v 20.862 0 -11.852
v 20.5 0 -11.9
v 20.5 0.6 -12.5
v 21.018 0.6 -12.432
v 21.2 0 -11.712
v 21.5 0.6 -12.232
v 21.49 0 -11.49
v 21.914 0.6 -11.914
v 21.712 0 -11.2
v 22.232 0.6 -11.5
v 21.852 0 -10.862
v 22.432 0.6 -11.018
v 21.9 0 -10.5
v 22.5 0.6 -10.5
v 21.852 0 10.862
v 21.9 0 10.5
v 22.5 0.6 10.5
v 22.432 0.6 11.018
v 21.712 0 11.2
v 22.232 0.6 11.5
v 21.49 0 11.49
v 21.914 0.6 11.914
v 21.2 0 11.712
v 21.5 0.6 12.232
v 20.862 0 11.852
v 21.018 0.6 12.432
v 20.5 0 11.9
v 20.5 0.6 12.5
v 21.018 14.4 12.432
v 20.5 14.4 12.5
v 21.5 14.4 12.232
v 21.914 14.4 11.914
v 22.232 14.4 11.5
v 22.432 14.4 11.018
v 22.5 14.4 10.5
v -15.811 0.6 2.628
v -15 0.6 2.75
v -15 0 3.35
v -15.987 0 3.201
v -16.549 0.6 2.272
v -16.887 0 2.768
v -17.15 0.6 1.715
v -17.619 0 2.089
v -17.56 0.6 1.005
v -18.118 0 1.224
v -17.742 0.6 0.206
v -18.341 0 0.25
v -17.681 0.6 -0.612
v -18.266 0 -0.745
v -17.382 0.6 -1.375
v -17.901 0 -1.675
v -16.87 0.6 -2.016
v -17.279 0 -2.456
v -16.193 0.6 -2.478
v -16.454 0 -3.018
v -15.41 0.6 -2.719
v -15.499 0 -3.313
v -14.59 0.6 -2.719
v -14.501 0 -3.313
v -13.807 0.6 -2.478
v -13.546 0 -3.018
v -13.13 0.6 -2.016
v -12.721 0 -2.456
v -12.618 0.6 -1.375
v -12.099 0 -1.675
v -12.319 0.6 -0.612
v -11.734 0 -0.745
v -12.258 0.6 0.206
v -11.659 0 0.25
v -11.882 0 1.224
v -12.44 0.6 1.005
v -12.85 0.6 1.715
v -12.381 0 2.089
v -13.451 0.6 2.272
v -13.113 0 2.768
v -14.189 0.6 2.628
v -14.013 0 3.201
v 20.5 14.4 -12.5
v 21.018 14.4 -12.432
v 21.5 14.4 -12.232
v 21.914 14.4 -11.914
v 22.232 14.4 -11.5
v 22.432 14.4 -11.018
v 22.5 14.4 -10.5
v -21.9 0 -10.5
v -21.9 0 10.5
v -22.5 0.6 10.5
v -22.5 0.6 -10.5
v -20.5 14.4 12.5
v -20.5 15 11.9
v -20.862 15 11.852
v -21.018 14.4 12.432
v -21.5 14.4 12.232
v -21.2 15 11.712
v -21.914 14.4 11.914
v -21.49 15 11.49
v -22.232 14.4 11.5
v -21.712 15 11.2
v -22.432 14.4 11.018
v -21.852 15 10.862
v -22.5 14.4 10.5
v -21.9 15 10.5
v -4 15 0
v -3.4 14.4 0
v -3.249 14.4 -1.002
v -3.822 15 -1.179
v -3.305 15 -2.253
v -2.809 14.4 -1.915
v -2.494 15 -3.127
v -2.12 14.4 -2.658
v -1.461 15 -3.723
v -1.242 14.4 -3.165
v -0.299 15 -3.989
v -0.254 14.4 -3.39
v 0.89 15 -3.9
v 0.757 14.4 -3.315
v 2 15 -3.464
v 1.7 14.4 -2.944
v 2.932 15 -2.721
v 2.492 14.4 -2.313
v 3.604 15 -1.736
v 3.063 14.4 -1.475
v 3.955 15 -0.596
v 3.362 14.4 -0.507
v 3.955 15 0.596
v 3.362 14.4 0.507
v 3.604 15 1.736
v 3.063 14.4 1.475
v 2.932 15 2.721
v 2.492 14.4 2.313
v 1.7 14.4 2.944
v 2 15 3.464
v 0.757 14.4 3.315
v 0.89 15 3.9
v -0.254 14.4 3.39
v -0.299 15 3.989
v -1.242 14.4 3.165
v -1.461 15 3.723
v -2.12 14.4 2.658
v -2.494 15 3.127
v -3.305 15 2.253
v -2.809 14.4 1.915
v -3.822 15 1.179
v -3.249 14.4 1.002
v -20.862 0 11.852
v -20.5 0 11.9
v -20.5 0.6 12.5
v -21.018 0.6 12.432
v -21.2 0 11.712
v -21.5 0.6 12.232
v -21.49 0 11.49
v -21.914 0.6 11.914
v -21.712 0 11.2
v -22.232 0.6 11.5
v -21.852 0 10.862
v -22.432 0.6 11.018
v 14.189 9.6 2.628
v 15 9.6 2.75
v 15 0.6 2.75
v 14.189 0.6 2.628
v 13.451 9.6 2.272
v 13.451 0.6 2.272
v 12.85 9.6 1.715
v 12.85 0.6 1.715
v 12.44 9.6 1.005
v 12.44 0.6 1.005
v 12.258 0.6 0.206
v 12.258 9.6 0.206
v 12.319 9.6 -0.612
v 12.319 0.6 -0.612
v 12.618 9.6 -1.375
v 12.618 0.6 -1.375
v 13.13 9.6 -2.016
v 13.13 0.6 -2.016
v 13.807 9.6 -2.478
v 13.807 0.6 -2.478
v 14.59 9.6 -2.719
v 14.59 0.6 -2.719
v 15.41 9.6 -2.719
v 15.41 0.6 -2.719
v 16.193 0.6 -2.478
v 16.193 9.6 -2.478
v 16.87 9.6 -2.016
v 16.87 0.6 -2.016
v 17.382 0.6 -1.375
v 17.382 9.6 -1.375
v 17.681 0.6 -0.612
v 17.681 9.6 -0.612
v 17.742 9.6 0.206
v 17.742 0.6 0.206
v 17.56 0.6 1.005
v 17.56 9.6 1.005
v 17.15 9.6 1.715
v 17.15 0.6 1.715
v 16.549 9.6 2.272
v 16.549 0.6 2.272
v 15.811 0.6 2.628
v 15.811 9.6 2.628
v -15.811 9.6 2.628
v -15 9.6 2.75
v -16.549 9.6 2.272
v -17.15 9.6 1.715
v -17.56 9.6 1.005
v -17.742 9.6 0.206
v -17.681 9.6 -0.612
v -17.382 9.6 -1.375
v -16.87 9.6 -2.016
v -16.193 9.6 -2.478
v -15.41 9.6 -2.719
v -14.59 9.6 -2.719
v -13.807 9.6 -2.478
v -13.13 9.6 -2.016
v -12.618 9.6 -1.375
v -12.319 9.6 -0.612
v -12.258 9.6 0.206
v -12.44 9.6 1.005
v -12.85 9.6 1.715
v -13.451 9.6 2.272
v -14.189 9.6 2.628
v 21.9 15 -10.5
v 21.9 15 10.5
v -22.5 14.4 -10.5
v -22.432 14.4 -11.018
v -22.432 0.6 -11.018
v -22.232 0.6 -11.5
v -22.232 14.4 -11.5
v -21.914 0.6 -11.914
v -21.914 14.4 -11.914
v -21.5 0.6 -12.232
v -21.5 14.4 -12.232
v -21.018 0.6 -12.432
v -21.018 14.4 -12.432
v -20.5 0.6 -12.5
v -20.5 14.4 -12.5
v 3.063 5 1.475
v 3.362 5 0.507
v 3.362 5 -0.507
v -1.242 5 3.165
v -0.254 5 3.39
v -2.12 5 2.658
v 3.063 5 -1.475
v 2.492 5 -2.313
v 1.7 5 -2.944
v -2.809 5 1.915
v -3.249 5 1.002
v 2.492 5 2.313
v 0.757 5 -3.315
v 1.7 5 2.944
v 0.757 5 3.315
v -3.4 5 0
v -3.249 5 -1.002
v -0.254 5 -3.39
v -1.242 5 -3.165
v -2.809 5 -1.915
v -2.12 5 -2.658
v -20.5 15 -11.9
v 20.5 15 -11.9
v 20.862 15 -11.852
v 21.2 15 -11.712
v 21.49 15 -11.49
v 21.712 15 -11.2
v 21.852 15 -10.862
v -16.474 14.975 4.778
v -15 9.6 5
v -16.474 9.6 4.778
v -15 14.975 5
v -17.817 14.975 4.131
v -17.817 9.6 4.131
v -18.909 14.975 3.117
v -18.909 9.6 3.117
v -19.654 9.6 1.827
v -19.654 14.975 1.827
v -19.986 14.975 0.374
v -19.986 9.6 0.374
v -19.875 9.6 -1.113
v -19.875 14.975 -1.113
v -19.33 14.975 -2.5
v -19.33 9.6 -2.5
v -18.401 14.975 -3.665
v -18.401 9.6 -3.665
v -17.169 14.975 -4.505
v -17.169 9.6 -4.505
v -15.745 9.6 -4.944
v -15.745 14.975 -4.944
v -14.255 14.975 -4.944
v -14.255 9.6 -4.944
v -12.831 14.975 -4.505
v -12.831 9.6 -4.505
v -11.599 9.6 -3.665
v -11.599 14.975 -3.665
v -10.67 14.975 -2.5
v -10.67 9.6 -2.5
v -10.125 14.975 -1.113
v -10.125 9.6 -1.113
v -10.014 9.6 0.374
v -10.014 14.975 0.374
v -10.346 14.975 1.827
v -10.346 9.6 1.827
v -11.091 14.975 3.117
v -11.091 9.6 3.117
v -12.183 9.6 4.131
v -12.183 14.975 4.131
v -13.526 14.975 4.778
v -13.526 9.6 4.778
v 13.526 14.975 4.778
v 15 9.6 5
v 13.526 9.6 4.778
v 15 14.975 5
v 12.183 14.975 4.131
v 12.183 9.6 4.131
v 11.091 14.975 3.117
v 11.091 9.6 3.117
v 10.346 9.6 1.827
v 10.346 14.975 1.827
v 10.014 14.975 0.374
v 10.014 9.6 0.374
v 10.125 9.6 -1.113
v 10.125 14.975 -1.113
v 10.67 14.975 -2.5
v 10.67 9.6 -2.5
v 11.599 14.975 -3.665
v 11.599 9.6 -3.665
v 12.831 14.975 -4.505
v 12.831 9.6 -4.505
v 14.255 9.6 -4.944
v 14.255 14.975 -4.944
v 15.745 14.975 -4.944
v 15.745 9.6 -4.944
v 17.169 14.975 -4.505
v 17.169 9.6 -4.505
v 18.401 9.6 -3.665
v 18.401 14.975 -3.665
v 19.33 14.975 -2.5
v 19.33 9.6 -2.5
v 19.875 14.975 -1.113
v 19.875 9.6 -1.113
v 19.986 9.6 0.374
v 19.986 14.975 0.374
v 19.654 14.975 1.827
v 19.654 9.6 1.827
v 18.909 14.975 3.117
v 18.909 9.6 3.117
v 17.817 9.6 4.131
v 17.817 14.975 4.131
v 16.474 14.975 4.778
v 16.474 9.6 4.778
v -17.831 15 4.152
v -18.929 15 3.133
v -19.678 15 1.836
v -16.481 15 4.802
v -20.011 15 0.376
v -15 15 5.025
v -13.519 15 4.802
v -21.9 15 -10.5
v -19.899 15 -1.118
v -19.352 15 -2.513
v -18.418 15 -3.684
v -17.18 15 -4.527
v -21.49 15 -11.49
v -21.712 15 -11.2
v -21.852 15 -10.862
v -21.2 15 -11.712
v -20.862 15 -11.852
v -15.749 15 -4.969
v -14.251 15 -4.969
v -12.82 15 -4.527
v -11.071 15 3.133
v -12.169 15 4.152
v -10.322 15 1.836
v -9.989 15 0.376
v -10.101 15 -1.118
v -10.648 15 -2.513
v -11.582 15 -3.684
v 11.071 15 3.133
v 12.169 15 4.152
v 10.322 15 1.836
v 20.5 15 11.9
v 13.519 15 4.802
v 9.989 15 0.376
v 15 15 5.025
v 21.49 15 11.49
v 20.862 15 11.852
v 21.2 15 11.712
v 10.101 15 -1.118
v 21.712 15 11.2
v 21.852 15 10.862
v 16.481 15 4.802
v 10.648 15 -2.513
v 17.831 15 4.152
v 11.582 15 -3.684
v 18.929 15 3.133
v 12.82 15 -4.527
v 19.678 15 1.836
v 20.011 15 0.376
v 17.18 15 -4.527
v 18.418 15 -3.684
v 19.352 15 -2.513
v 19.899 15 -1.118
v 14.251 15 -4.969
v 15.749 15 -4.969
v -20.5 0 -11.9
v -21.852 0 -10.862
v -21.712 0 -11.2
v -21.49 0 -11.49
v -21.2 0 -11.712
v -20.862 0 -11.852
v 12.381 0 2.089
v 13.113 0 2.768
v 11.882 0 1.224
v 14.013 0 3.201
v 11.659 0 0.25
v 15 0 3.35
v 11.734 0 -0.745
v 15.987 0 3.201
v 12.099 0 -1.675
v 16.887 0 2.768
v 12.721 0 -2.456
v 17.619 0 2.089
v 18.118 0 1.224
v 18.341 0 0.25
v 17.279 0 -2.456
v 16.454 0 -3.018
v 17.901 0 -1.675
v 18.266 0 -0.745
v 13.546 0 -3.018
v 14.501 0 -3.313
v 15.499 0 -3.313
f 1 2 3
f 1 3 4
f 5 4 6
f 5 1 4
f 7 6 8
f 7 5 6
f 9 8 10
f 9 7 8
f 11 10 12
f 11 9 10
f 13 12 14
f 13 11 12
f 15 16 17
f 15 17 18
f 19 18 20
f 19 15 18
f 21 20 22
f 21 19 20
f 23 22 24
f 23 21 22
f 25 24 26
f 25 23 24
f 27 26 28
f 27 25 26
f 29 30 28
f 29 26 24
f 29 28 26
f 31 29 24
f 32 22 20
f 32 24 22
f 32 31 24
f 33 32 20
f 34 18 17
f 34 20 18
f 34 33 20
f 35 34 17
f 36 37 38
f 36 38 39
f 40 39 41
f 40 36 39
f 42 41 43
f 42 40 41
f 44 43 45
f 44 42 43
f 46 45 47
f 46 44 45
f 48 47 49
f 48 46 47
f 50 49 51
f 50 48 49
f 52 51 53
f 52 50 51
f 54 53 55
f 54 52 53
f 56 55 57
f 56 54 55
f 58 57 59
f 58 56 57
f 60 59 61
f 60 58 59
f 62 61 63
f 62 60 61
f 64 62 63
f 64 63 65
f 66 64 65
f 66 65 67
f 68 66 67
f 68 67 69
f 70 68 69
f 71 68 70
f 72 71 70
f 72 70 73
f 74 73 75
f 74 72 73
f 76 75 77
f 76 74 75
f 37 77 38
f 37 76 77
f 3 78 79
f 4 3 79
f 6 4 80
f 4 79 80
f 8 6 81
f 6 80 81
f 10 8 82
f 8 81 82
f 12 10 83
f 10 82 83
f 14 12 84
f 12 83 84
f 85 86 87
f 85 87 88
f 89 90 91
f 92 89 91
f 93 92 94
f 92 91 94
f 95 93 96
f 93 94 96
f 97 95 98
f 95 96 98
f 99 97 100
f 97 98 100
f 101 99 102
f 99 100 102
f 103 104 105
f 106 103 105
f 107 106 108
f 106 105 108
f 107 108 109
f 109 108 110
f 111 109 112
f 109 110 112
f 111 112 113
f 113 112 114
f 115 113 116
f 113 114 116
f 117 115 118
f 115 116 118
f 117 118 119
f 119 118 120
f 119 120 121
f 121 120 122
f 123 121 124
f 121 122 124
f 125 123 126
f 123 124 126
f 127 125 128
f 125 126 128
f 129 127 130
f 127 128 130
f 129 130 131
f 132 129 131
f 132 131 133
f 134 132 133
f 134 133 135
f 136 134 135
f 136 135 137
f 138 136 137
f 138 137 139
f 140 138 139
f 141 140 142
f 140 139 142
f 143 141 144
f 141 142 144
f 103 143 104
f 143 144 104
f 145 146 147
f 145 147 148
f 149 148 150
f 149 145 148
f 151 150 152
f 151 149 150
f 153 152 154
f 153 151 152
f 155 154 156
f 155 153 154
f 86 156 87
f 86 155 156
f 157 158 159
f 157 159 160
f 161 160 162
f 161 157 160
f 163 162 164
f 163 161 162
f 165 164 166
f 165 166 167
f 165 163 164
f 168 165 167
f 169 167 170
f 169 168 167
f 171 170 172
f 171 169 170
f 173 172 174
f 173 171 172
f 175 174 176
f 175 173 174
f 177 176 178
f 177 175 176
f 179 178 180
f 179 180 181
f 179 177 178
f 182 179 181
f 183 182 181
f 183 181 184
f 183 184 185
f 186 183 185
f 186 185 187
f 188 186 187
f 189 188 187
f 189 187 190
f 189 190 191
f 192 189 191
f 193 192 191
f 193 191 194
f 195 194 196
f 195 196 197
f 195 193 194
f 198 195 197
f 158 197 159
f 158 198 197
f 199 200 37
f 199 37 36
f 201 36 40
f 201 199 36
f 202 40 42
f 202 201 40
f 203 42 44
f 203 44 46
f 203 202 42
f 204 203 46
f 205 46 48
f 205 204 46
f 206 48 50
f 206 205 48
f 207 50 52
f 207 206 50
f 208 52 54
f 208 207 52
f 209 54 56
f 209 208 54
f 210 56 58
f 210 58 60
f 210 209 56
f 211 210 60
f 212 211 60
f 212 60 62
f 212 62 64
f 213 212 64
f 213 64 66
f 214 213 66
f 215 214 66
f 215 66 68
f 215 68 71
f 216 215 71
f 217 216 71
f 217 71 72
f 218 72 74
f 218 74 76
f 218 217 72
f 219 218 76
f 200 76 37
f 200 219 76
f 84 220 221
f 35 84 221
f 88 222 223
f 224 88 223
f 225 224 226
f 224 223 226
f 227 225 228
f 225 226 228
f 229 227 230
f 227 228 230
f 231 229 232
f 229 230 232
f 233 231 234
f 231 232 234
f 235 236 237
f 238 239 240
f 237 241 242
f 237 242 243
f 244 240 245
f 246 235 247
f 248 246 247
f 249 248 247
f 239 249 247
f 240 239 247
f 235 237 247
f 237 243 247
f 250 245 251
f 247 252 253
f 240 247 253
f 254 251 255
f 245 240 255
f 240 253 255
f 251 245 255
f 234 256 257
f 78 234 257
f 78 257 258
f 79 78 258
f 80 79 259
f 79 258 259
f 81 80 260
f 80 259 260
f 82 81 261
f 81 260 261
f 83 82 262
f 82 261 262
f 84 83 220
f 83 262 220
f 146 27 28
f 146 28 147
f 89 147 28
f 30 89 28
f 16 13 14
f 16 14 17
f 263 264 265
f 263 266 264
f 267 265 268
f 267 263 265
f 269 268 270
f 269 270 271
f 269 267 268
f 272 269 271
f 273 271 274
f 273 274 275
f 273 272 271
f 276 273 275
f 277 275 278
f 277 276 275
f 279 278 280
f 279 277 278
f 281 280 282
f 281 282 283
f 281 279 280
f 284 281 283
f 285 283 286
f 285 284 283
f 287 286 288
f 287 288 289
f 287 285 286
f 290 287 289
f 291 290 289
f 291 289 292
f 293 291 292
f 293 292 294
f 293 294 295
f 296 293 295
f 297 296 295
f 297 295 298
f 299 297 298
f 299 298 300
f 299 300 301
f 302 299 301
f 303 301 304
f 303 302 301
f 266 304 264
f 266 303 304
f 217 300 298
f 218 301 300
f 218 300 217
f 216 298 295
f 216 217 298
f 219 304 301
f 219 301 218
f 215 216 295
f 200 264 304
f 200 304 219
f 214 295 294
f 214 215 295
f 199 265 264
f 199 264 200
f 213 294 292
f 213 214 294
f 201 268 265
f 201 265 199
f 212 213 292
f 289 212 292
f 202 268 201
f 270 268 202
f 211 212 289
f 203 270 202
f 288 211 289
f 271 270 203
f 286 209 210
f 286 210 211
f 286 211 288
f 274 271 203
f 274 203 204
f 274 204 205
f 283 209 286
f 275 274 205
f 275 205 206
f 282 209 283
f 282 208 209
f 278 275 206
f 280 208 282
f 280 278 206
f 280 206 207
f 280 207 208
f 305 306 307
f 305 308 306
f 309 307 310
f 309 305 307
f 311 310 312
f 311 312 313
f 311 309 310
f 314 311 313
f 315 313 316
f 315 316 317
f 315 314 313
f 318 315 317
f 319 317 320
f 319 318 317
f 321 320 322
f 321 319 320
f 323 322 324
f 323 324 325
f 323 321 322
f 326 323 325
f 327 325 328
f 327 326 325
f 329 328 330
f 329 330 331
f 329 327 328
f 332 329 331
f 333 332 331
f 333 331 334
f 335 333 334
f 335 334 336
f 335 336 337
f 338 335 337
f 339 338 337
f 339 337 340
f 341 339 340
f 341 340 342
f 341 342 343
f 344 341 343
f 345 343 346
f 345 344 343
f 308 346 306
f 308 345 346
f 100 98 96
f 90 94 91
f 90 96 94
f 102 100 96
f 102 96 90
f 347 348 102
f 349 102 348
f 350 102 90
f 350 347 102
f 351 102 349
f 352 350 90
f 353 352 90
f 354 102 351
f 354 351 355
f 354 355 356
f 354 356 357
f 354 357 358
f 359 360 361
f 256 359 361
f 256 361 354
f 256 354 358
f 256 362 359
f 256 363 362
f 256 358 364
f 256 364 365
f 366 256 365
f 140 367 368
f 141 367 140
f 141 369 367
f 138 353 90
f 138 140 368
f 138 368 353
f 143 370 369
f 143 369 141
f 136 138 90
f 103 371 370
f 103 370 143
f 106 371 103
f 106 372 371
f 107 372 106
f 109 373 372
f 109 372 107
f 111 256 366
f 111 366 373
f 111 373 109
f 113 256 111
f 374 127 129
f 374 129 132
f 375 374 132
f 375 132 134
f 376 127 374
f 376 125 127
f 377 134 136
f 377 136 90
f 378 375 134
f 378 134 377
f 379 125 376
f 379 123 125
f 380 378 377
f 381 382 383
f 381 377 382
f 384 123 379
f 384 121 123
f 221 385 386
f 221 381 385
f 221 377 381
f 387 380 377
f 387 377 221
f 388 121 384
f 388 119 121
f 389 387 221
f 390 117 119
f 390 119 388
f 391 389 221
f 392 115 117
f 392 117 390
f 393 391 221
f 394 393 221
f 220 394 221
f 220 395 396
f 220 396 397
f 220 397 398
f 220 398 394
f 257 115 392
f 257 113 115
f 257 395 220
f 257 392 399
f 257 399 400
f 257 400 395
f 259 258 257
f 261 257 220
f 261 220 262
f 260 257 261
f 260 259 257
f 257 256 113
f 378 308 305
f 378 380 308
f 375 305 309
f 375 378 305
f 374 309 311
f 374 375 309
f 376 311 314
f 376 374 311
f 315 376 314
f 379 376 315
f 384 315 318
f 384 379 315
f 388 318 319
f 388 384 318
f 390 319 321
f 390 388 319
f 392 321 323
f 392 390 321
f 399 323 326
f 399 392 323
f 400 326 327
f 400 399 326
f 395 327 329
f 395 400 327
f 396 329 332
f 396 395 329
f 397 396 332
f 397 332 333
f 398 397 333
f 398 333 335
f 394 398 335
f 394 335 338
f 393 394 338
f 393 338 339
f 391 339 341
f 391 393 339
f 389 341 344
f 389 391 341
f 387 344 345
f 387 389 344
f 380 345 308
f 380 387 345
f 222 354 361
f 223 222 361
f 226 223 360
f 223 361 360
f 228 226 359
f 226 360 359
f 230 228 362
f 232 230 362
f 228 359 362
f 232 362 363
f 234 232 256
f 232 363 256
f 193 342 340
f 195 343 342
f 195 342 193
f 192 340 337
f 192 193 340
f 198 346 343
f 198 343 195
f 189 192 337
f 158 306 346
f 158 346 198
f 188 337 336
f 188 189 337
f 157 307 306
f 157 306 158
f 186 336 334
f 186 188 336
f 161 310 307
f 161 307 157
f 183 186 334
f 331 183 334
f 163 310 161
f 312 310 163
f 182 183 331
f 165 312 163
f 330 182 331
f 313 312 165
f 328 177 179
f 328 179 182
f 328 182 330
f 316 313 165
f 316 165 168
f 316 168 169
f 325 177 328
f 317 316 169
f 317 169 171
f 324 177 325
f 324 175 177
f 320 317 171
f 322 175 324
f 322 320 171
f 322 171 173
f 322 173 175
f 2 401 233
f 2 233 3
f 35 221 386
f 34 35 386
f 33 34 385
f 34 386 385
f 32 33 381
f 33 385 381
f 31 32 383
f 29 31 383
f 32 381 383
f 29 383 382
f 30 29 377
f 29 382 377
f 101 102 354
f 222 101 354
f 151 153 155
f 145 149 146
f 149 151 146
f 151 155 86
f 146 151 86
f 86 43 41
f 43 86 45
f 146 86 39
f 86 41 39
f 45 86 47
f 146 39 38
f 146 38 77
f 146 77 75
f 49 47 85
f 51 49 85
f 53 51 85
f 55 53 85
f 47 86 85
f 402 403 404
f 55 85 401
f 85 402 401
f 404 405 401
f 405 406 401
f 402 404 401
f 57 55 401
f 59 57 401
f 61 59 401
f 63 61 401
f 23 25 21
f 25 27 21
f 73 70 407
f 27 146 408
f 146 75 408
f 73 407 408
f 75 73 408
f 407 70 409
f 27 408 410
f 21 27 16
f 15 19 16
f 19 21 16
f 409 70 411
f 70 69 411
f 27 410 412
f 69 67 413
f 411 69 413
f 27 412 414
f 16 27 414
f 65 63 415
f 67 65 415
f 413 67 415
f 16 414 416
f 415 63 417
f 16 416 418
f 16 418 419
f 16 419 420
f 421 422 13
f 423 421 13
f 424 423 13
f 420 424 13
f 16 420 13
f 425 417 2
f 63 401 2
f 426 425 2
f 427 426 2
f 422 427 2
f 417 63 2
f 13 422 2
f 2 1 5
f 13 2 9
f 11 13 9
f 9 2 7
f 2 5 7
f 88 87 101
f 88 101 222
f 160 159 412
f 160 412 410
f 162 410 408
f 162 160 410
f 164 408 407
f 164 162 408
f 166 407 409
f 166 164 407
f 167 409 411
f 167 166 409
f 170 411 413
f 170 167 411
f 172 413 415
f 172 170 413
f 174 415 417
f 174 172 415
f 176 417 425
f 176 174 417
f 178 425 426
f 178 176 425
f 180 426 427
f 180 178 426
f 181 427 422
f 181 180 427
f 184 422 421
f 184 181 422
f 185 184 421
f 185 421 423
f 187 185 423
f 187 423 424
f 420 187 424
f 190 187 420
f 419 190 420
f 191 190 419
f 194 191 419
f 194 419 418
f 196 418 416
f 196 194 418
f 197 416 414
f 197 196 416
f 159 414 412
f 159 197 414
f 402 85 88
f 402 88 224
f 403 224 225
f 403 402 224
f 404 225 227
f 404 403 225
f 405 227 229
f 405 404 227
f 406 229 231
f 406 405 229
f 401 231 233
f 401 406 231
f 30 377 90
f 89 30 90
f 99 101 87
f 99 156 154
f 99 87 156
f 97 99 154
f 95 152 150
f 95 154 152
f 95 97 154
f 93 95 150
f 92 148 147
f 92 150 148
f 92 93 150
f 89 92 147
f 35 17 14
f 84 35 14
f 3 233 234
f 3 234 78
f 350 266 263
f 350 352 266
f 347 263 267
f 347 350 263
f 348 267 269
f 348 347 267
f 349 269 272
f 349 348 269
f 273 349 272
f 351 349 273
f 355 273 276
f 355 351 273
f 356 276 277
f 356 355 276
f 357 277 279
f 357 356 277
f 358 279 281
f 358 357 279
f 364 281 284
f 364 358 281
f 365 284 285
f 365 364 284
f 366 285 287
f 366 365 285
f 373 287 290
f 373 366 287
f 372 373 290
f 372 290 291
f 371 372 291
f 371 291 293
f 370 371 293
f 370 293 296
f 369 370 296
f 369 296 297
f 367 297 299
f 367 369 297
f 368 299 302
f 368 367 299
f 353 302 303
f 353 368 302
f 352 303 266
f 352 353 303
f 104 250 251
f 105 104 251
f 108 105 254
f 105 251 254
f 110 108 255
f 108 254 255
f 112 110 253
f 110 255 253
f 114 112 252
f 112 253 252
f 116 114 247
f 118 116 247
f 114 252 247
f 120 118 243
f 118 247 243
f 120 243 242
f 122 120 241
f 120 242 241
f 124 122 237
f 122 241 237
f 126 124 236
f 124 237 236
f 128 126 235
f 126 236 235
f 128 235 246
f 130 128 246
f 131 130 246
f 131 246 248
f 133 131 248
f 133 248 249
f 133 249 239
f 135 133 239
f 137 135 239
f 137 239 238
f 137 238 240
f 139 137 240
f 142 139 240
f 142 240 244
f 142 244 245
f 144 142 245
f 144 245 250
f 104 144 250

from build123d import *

# Parameters (mm, degrees)
SKETCH1_W                                    = 45
SKETCH1_H                                    = 25
BOSS_EXTRUDE1_DEPTH                          = 15
HOLE1_D                                      = 6.8
HOLE1_DEPTH                                  = 10
CBORE_FOR_M5_HEX_SOCKET_HEAD_CAP_SCR_2_COUNT = 2
CBORE_FOR_M5_HEX_SOCKET_HEAD_CAP_SCR_2_PITCH = 30
FILLET1_R                                    = 2
CHAMFER1_SIZE                                = 0.6


with BuildPart() as part:
    # Sketch1 → Boss-Extrude1 (new body)
    with BuildSketch(Plane(origin=(0, 0, 0), x_dir=(1, 0, 0), z_dir=(0, 1, 0))):
        Rectangle(SKETCH1_W, SKETCH1_H)
    extrude(amount=BOSS_EXTRUDE1_DEPTH)

    # Hole1
    with Locations(Plane(origin=(0, 15, 0), x_dir=(1, 0, 0), z_dir=(0, 1, 0))):
        with Locations((0, 0)):
            Hole(HOLE1_D / 2, depth=HOLE1_DEPTH)

    # Sketch7 → CBORE for M5 Hex Socket Head Cap Screw1 (revolve, cut)
    with BuildSketch(Plane(origin=(15, 15, 0), x_dir=(0, 0, 1), z_dir=(1, 0, 0))):
        Polygon((0, 0), (0, 15), (2.75, 15), (2.75, 5.4), (5, 5.4), (5, 0.025), (5.025, 0), align=None)
    cbore_for_m5_hex_socket_head_cap_screw1 = revolve(axis=Axis((15, 21.35, 0), (0, -1, 0)), mode=Mode.SUBTRACT)

    # CBORE for M5 Hex Socket Head Cap Scr 2: CBORE for M5 Hex Socket Head Cap Screw1 ×2
    with Locations(*[(-i * CBORE_FOR_M5_HEX_SOCKET_HEAD_CAP_SCR_2_PITCH, 0, 0) for i in range(1, CBORE_FOR_M5_HEX_SOCKET_HEAD_CAP_SCR_2_COUNT)]):
        add(cbore_for_m5_hex_socket_head_cap_screw1, mode=Mode.SUBTRACT)

    # Fillet1
    fillet1_edges = [part.edges().sort_by_distance(p)[0] for p in [
        (-22.5, 7.5, -12.5),
        (22.5, 7.5, -12.5),
        (22.5, 7.5, 12.5),
        (-22.5, 7.5, 12.5),
    ]]
    fillet(fillet1_edges, radius=FILLET1_R)

    # Chamfer1
    chamfer1_edges = [part.edges().sort_by_distance(p)[0] for p in [
        (3.4, 15, 0),
        (15, 0, -2.75),
        (-15, 0, -2.75),
        (-22.5, 0, 0),
        (-22.5, 15, 0),
        (0, 0, -12.5),
        (22.5, 0, 0),
        (0, 0, 12.5),
        (21.914213562, 0, 11.914213562),
        (21.914213562, 0, -11.914213562),
        (-21.914213562, 0, 11.914213562),
        (-21.914213562, 0, -11.914213562),
        (0, 15, -12.5),
        (0, 15, 12.5),
        (22.5, 15, 0),
        (21.914213562, 15, 11.914213562),
        (21.914213562, 15, -11.914213562),
        (-21.914213562, 15, 11.914213562),
        (-21.914213562, 15, -11.914213562),
    ]]
    chamfer(chamfer1_edges, length=CHAMFER1_SIZE)


solid = part.part
